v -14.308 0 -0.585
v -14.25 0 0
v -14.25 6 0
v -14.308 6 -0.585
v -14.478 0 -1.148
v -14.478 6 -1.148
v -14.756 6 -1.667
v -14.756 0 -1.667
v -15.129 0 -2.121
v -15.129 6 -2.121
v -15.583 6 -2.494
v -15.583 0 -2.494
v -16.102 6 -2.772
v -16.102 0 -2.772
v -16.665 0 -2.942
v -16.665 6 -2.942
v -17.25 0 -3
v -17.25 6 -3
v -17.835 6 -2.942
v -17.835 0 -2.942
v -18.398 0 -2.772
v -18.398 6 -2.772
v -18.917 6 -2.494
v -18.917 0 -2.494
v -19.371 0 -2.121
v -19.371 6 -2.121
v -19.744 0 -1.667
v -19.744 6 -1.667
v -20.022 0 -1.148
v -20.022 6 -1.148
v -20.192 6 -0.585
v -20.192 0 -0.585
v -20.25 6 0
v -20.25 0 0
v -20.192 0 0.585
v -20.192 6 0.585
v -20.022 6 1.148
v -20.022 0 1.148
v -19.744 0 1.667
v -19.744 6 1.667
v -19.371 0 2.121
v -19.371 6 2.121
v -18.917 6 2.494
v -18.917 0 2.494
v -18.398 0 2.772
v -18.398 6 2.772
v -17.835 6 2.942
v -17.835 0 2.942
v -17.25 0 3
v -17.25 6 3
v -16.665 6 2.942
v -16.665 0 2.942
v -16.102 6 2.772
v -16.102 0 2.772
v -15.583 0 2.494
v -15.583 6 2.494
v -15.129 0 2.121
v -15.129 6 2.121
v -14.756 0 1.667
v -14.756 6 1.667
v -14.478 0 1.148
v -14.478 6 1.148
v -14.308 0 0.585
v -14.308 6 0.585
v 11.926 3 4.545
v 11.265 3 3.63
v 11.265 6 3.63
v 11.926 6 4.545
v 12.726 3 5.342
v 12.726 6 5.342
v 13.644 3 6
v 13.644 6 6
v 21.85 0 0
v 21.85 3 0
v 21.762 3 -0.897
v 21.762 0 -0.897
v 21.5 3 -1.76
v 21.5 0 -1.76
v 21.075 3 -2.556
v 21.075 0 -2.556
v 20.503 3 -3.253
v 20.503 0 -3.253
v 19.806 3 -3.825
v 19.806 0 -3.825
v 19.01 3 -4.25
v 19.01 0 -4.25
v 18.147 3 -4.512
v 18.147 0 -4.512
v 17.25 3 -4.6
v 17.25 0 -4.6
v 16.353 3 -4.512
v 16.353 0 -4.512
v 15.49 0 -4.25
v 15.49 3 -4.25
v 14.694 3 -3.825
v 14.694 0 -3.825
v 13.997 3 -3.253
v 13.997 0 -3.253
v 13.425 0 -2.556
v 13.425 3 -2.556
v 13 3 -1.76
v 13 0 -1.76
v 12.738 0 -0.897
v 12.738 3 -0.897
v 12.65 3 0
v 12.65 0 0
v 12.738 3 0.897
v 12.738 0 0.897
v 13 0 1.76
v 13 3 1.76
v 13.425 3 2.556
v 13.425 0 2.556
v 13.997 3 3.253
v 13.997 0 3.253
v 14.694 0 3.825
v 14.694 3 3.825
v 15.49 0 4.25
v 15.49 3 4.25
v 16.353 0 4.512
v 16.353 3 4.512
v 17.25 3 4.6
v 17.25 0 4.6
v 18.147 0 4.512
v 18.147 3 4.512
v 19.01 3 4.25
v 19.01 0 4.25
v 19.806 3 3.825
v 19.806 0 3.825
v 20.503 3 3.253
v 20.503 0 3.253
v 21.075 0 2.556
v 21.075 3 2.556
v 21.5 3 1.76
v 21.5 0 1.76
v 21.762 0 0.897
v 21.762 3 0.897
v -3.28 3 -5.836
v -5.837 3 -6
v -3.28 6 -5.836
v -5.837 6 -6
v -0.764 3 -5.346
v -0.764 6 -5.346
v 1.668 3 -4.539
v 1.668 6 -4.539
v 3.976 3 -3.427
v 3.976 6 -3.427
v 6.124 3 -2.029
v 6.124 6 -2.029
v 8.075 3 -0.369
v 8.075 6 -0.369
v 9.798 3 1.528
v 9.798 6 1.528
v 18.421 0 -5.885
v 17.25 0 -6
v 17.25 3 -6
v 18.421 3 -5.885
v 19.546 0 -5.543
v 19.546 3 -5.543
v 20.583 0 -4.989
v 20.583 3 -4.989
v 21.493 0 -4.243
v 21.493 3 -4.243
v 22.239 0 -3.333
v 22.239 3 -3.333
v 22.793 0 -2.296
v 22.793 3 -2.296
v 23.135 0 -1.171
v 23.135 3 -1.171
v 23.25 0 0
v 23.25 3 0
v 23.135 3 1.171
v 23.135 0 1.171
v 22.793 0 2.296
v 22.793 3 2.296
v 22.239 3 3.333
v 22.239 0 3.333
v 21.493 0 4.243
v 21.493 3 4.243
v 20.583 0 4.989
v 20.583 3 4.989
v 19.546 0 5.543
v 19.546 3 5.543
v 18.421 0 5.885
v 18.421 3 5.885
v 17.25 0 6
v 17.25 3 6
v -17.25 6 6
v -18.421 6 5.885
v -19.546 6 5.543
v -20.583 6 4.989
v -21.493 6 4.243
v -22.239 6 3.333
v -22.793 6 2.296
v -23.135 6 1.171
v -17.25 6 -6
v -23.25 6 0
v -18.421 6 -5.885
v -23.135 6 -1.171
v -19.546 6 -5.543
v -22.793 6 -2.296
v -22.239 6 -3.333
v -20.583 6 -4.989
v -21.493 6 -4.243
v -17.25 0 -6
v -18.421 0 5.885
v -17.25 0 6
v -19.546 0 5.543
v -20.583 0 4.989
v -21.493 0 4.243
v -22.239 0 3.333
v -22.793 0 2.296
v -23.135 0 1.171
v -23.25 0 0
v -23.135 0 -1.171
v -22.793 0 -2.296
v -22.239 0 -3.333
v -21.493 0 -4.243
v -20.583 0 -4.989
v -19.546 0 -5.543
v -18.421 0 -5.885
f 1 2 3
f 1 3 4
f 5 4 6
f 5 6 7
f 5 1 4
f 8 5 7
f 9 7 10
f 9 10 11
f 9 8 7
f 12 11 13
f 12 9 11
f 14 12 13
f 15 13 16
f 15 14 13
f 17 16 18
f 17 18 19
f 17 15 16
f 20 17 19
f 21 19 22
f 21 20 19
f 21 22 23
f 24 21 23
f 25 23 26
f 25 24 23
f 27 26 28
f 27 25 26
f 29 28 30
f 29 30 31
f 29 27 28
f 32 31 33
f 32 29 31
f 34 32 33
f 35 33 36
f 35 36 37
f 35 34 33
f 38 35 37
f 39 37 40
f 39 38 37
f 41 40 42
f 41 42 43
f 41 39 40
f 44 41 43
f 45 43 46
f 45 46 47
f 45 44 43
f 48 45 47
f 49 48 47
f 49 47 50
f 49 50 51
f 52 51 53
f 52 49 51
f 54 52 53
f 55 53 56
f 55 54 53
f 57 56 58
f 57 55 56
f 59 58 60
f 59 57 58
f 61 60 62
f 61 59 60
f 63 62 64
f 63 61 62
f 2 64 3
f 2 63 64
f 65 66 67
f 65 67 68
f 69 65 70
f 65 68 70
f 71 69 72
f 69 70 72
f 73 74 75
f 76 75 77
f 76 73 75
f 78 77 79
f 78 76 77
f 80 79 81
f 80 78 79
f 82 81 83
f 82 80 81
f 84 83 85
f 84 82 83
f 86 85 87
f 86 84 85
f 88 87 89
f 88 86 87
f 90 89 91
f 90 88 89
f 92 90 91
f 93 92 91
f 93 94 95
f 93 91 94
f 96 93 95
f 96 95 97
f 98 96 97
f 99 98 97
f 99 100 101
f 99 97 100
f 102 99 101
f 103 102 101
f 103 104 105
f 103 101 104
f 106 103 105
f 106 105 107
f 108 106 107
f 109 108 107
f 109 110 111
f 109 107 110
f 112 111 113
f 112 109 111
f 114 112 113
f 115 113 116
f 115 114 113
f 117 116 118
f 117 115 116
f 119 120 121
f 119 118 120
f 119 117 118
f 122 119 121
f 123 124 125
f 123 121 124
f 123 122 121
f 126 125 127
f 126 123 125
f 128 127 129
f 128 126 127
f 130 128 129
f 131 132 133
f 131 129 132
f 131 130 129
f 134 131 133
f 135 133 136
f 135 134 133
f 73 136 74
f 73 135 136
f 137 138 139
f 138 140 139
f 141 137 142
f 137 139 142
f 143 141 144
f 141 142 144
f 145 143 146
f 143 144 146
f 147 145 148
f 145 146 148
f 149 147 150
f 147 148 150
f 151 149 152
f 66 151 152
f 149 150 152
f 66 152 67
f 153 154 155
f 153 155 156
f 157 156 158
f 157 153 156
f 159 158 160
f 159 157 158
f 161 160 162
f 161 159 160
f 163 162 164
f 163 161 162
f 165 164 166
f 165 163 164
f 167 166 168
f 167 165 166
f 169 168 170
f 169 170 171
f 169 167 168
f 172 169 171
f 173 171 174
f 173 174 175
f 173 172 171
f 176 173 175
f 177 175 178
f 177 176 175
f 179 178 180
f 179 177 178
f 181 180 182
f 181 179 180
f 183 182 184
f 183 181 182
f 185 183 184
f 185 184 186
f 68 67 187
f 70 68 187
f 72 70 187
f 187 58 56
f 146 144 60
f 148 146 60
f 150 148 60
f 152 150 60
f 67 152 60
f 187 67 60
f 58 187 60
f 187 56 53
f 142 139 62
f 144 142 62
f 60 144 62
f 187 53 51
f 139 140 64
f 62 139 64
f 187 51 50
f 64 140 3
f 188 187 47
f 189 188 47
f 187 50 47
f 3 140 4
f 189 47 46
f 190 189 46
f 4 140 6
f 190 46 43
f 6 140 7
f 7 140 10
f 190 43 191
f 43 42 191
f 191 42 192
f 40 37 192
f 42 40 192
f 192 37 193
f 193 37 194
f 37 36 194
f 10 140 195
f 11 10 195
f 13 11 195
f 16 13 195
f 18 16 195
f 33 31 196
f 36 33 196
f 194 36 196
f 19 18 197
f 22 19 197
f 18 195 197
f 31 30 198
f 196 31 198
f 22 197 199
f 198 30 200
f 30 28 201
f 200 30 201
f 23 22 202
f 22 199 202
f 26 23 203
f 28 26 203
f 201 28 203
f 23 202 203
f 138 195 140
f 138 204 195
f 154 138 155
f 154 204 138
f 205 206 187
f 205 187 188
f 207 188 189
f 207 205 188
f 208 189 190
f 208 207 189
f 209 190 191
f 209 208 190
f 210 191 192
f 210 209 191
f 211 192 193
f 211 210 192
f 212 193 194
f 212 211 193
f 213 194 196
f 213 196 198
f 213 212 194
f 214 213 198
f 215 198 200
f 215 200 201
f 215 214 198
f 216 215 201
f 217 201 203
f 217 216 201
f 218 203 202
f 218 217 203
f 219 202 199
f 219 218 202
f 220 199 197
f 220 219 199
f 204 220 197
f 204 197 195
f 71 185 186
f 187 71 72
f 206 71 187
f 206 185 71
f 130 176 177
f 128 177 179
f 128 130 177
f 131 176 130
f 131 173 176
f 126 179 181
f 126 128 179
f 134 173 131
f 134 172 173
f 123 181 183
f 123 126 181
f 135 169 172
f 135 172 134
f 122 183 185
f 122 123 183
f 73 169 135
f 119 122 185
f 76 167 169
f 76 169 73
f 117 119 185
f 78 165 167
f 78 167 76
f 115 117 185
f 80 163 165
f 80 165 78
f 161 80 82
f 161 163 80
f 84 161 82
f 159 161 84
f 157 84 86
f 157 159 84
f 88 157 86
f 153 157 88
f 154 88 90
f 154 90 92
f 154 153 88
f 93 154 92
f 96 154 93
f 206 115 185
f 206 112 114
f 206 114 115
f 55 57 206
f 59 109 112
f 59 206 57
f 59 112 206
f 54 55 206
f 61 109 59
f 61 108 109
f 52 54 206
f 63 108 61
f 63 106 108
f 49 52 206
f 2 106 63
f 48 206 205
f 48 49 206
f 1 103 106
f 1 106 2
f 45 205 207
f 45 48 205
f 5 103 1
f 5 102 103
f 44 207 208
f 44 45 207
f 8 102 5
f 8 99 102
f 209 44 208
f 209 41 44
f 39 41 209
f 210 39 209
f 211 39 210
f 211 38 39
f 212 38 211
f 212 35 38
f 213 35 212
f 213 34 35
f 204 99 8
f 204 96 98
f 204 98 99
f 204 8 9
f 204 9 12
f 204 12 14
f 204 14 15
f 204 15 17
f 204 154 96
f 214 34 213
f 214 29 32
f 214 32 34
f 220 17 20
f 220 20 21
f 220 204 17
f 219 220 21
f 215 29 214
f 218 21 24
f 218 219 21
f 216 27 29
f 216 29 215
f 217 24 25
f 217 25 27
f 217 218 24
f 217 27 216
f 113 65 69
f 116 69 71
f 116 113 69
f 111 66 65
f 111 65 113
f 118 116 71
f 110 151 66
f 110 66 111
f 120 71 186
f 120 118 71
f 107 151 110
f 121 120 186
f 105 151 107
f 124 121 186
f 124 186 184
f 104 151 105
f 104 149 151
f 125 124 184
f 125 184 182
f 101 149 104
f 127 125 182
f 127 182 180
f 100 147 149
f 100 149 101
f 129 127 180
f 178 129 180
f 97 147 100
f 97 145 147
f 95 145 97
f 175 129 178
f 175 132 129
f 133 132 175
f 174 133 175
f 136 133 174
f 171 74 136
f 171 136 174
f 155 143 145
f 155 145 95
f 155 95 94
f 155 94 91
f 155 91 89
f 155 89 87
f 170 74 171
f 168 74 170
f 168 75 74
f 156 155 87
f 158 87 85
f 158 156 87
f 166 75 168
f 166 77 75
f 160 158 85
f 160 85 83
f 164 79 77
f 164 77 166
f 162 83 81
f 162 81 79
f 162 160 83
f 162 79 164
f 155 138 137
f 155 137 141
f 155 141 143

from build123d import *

# Parameters (mm, degrees)
SKETCH_1_R          = 3
SKETCH_1_R_2        = 4.6
EXTRUDE_1_DEPTH     = 6
SKETCH_3_R          = 7
CUT_EXTRUDE_1_DEPTH = 3
FILLET_1_R          = 20


with BuildPart() as part:
    # ｽｹｯﾁ1 → ﾎﾞｽ - 押し出し1 (new body)
    with BuildSketch(Plane(origin=(0, 0, 0), x_dir=(1, 0, 0), z_dir=(0, 1, 0))):
        with BuildLine():
            Line((-17.25, 6), (17.25, 6))
            ThreePointArc((17.25, 6), (23.25, 0), (17.25, -6))
            Line((17.25, -6), (-17.25, -6))
            ThreePointArc((-17.25, -6), (-23.25, 0), (-17.25, 6))
        make_face()
        with Locations((-17.25, 0)):
            Circle(SKETCH_1_R, mode=Mode.SUBTRACT)
        with Locations((17.25, 0)):
            Circle(SKETCH_1_R_2, mode=Mode.SUBTRACT)
    extrude(amount=EXTRUDE_1_DEPTH)

    # ｽｹｯﾁ3 → ｶｯﾄ - 押し出し1 (cut)
    with BuildSketch(Plane(origin=(0, 6, 0), x_dir=(1, 0, 0), z_dir=(0, 1, 0))):
        with Locations((17.25, 0)):
            Circle(SKETCH_3_R)
    extrude(amount=-CUT_EXTRUDE_1_DEPTH, mode=Mode.SUBTRACT)

    # ﾌｨﾚｯﾄ1
    fillet_1_edges = [part.edges().sort_by_distance(p)[0] for p in [
        (13.644448725, 4.5, -6),
    ]]
    fillet(fillet_1_edges, radius=FILLET_1_R)


solid = part.part
